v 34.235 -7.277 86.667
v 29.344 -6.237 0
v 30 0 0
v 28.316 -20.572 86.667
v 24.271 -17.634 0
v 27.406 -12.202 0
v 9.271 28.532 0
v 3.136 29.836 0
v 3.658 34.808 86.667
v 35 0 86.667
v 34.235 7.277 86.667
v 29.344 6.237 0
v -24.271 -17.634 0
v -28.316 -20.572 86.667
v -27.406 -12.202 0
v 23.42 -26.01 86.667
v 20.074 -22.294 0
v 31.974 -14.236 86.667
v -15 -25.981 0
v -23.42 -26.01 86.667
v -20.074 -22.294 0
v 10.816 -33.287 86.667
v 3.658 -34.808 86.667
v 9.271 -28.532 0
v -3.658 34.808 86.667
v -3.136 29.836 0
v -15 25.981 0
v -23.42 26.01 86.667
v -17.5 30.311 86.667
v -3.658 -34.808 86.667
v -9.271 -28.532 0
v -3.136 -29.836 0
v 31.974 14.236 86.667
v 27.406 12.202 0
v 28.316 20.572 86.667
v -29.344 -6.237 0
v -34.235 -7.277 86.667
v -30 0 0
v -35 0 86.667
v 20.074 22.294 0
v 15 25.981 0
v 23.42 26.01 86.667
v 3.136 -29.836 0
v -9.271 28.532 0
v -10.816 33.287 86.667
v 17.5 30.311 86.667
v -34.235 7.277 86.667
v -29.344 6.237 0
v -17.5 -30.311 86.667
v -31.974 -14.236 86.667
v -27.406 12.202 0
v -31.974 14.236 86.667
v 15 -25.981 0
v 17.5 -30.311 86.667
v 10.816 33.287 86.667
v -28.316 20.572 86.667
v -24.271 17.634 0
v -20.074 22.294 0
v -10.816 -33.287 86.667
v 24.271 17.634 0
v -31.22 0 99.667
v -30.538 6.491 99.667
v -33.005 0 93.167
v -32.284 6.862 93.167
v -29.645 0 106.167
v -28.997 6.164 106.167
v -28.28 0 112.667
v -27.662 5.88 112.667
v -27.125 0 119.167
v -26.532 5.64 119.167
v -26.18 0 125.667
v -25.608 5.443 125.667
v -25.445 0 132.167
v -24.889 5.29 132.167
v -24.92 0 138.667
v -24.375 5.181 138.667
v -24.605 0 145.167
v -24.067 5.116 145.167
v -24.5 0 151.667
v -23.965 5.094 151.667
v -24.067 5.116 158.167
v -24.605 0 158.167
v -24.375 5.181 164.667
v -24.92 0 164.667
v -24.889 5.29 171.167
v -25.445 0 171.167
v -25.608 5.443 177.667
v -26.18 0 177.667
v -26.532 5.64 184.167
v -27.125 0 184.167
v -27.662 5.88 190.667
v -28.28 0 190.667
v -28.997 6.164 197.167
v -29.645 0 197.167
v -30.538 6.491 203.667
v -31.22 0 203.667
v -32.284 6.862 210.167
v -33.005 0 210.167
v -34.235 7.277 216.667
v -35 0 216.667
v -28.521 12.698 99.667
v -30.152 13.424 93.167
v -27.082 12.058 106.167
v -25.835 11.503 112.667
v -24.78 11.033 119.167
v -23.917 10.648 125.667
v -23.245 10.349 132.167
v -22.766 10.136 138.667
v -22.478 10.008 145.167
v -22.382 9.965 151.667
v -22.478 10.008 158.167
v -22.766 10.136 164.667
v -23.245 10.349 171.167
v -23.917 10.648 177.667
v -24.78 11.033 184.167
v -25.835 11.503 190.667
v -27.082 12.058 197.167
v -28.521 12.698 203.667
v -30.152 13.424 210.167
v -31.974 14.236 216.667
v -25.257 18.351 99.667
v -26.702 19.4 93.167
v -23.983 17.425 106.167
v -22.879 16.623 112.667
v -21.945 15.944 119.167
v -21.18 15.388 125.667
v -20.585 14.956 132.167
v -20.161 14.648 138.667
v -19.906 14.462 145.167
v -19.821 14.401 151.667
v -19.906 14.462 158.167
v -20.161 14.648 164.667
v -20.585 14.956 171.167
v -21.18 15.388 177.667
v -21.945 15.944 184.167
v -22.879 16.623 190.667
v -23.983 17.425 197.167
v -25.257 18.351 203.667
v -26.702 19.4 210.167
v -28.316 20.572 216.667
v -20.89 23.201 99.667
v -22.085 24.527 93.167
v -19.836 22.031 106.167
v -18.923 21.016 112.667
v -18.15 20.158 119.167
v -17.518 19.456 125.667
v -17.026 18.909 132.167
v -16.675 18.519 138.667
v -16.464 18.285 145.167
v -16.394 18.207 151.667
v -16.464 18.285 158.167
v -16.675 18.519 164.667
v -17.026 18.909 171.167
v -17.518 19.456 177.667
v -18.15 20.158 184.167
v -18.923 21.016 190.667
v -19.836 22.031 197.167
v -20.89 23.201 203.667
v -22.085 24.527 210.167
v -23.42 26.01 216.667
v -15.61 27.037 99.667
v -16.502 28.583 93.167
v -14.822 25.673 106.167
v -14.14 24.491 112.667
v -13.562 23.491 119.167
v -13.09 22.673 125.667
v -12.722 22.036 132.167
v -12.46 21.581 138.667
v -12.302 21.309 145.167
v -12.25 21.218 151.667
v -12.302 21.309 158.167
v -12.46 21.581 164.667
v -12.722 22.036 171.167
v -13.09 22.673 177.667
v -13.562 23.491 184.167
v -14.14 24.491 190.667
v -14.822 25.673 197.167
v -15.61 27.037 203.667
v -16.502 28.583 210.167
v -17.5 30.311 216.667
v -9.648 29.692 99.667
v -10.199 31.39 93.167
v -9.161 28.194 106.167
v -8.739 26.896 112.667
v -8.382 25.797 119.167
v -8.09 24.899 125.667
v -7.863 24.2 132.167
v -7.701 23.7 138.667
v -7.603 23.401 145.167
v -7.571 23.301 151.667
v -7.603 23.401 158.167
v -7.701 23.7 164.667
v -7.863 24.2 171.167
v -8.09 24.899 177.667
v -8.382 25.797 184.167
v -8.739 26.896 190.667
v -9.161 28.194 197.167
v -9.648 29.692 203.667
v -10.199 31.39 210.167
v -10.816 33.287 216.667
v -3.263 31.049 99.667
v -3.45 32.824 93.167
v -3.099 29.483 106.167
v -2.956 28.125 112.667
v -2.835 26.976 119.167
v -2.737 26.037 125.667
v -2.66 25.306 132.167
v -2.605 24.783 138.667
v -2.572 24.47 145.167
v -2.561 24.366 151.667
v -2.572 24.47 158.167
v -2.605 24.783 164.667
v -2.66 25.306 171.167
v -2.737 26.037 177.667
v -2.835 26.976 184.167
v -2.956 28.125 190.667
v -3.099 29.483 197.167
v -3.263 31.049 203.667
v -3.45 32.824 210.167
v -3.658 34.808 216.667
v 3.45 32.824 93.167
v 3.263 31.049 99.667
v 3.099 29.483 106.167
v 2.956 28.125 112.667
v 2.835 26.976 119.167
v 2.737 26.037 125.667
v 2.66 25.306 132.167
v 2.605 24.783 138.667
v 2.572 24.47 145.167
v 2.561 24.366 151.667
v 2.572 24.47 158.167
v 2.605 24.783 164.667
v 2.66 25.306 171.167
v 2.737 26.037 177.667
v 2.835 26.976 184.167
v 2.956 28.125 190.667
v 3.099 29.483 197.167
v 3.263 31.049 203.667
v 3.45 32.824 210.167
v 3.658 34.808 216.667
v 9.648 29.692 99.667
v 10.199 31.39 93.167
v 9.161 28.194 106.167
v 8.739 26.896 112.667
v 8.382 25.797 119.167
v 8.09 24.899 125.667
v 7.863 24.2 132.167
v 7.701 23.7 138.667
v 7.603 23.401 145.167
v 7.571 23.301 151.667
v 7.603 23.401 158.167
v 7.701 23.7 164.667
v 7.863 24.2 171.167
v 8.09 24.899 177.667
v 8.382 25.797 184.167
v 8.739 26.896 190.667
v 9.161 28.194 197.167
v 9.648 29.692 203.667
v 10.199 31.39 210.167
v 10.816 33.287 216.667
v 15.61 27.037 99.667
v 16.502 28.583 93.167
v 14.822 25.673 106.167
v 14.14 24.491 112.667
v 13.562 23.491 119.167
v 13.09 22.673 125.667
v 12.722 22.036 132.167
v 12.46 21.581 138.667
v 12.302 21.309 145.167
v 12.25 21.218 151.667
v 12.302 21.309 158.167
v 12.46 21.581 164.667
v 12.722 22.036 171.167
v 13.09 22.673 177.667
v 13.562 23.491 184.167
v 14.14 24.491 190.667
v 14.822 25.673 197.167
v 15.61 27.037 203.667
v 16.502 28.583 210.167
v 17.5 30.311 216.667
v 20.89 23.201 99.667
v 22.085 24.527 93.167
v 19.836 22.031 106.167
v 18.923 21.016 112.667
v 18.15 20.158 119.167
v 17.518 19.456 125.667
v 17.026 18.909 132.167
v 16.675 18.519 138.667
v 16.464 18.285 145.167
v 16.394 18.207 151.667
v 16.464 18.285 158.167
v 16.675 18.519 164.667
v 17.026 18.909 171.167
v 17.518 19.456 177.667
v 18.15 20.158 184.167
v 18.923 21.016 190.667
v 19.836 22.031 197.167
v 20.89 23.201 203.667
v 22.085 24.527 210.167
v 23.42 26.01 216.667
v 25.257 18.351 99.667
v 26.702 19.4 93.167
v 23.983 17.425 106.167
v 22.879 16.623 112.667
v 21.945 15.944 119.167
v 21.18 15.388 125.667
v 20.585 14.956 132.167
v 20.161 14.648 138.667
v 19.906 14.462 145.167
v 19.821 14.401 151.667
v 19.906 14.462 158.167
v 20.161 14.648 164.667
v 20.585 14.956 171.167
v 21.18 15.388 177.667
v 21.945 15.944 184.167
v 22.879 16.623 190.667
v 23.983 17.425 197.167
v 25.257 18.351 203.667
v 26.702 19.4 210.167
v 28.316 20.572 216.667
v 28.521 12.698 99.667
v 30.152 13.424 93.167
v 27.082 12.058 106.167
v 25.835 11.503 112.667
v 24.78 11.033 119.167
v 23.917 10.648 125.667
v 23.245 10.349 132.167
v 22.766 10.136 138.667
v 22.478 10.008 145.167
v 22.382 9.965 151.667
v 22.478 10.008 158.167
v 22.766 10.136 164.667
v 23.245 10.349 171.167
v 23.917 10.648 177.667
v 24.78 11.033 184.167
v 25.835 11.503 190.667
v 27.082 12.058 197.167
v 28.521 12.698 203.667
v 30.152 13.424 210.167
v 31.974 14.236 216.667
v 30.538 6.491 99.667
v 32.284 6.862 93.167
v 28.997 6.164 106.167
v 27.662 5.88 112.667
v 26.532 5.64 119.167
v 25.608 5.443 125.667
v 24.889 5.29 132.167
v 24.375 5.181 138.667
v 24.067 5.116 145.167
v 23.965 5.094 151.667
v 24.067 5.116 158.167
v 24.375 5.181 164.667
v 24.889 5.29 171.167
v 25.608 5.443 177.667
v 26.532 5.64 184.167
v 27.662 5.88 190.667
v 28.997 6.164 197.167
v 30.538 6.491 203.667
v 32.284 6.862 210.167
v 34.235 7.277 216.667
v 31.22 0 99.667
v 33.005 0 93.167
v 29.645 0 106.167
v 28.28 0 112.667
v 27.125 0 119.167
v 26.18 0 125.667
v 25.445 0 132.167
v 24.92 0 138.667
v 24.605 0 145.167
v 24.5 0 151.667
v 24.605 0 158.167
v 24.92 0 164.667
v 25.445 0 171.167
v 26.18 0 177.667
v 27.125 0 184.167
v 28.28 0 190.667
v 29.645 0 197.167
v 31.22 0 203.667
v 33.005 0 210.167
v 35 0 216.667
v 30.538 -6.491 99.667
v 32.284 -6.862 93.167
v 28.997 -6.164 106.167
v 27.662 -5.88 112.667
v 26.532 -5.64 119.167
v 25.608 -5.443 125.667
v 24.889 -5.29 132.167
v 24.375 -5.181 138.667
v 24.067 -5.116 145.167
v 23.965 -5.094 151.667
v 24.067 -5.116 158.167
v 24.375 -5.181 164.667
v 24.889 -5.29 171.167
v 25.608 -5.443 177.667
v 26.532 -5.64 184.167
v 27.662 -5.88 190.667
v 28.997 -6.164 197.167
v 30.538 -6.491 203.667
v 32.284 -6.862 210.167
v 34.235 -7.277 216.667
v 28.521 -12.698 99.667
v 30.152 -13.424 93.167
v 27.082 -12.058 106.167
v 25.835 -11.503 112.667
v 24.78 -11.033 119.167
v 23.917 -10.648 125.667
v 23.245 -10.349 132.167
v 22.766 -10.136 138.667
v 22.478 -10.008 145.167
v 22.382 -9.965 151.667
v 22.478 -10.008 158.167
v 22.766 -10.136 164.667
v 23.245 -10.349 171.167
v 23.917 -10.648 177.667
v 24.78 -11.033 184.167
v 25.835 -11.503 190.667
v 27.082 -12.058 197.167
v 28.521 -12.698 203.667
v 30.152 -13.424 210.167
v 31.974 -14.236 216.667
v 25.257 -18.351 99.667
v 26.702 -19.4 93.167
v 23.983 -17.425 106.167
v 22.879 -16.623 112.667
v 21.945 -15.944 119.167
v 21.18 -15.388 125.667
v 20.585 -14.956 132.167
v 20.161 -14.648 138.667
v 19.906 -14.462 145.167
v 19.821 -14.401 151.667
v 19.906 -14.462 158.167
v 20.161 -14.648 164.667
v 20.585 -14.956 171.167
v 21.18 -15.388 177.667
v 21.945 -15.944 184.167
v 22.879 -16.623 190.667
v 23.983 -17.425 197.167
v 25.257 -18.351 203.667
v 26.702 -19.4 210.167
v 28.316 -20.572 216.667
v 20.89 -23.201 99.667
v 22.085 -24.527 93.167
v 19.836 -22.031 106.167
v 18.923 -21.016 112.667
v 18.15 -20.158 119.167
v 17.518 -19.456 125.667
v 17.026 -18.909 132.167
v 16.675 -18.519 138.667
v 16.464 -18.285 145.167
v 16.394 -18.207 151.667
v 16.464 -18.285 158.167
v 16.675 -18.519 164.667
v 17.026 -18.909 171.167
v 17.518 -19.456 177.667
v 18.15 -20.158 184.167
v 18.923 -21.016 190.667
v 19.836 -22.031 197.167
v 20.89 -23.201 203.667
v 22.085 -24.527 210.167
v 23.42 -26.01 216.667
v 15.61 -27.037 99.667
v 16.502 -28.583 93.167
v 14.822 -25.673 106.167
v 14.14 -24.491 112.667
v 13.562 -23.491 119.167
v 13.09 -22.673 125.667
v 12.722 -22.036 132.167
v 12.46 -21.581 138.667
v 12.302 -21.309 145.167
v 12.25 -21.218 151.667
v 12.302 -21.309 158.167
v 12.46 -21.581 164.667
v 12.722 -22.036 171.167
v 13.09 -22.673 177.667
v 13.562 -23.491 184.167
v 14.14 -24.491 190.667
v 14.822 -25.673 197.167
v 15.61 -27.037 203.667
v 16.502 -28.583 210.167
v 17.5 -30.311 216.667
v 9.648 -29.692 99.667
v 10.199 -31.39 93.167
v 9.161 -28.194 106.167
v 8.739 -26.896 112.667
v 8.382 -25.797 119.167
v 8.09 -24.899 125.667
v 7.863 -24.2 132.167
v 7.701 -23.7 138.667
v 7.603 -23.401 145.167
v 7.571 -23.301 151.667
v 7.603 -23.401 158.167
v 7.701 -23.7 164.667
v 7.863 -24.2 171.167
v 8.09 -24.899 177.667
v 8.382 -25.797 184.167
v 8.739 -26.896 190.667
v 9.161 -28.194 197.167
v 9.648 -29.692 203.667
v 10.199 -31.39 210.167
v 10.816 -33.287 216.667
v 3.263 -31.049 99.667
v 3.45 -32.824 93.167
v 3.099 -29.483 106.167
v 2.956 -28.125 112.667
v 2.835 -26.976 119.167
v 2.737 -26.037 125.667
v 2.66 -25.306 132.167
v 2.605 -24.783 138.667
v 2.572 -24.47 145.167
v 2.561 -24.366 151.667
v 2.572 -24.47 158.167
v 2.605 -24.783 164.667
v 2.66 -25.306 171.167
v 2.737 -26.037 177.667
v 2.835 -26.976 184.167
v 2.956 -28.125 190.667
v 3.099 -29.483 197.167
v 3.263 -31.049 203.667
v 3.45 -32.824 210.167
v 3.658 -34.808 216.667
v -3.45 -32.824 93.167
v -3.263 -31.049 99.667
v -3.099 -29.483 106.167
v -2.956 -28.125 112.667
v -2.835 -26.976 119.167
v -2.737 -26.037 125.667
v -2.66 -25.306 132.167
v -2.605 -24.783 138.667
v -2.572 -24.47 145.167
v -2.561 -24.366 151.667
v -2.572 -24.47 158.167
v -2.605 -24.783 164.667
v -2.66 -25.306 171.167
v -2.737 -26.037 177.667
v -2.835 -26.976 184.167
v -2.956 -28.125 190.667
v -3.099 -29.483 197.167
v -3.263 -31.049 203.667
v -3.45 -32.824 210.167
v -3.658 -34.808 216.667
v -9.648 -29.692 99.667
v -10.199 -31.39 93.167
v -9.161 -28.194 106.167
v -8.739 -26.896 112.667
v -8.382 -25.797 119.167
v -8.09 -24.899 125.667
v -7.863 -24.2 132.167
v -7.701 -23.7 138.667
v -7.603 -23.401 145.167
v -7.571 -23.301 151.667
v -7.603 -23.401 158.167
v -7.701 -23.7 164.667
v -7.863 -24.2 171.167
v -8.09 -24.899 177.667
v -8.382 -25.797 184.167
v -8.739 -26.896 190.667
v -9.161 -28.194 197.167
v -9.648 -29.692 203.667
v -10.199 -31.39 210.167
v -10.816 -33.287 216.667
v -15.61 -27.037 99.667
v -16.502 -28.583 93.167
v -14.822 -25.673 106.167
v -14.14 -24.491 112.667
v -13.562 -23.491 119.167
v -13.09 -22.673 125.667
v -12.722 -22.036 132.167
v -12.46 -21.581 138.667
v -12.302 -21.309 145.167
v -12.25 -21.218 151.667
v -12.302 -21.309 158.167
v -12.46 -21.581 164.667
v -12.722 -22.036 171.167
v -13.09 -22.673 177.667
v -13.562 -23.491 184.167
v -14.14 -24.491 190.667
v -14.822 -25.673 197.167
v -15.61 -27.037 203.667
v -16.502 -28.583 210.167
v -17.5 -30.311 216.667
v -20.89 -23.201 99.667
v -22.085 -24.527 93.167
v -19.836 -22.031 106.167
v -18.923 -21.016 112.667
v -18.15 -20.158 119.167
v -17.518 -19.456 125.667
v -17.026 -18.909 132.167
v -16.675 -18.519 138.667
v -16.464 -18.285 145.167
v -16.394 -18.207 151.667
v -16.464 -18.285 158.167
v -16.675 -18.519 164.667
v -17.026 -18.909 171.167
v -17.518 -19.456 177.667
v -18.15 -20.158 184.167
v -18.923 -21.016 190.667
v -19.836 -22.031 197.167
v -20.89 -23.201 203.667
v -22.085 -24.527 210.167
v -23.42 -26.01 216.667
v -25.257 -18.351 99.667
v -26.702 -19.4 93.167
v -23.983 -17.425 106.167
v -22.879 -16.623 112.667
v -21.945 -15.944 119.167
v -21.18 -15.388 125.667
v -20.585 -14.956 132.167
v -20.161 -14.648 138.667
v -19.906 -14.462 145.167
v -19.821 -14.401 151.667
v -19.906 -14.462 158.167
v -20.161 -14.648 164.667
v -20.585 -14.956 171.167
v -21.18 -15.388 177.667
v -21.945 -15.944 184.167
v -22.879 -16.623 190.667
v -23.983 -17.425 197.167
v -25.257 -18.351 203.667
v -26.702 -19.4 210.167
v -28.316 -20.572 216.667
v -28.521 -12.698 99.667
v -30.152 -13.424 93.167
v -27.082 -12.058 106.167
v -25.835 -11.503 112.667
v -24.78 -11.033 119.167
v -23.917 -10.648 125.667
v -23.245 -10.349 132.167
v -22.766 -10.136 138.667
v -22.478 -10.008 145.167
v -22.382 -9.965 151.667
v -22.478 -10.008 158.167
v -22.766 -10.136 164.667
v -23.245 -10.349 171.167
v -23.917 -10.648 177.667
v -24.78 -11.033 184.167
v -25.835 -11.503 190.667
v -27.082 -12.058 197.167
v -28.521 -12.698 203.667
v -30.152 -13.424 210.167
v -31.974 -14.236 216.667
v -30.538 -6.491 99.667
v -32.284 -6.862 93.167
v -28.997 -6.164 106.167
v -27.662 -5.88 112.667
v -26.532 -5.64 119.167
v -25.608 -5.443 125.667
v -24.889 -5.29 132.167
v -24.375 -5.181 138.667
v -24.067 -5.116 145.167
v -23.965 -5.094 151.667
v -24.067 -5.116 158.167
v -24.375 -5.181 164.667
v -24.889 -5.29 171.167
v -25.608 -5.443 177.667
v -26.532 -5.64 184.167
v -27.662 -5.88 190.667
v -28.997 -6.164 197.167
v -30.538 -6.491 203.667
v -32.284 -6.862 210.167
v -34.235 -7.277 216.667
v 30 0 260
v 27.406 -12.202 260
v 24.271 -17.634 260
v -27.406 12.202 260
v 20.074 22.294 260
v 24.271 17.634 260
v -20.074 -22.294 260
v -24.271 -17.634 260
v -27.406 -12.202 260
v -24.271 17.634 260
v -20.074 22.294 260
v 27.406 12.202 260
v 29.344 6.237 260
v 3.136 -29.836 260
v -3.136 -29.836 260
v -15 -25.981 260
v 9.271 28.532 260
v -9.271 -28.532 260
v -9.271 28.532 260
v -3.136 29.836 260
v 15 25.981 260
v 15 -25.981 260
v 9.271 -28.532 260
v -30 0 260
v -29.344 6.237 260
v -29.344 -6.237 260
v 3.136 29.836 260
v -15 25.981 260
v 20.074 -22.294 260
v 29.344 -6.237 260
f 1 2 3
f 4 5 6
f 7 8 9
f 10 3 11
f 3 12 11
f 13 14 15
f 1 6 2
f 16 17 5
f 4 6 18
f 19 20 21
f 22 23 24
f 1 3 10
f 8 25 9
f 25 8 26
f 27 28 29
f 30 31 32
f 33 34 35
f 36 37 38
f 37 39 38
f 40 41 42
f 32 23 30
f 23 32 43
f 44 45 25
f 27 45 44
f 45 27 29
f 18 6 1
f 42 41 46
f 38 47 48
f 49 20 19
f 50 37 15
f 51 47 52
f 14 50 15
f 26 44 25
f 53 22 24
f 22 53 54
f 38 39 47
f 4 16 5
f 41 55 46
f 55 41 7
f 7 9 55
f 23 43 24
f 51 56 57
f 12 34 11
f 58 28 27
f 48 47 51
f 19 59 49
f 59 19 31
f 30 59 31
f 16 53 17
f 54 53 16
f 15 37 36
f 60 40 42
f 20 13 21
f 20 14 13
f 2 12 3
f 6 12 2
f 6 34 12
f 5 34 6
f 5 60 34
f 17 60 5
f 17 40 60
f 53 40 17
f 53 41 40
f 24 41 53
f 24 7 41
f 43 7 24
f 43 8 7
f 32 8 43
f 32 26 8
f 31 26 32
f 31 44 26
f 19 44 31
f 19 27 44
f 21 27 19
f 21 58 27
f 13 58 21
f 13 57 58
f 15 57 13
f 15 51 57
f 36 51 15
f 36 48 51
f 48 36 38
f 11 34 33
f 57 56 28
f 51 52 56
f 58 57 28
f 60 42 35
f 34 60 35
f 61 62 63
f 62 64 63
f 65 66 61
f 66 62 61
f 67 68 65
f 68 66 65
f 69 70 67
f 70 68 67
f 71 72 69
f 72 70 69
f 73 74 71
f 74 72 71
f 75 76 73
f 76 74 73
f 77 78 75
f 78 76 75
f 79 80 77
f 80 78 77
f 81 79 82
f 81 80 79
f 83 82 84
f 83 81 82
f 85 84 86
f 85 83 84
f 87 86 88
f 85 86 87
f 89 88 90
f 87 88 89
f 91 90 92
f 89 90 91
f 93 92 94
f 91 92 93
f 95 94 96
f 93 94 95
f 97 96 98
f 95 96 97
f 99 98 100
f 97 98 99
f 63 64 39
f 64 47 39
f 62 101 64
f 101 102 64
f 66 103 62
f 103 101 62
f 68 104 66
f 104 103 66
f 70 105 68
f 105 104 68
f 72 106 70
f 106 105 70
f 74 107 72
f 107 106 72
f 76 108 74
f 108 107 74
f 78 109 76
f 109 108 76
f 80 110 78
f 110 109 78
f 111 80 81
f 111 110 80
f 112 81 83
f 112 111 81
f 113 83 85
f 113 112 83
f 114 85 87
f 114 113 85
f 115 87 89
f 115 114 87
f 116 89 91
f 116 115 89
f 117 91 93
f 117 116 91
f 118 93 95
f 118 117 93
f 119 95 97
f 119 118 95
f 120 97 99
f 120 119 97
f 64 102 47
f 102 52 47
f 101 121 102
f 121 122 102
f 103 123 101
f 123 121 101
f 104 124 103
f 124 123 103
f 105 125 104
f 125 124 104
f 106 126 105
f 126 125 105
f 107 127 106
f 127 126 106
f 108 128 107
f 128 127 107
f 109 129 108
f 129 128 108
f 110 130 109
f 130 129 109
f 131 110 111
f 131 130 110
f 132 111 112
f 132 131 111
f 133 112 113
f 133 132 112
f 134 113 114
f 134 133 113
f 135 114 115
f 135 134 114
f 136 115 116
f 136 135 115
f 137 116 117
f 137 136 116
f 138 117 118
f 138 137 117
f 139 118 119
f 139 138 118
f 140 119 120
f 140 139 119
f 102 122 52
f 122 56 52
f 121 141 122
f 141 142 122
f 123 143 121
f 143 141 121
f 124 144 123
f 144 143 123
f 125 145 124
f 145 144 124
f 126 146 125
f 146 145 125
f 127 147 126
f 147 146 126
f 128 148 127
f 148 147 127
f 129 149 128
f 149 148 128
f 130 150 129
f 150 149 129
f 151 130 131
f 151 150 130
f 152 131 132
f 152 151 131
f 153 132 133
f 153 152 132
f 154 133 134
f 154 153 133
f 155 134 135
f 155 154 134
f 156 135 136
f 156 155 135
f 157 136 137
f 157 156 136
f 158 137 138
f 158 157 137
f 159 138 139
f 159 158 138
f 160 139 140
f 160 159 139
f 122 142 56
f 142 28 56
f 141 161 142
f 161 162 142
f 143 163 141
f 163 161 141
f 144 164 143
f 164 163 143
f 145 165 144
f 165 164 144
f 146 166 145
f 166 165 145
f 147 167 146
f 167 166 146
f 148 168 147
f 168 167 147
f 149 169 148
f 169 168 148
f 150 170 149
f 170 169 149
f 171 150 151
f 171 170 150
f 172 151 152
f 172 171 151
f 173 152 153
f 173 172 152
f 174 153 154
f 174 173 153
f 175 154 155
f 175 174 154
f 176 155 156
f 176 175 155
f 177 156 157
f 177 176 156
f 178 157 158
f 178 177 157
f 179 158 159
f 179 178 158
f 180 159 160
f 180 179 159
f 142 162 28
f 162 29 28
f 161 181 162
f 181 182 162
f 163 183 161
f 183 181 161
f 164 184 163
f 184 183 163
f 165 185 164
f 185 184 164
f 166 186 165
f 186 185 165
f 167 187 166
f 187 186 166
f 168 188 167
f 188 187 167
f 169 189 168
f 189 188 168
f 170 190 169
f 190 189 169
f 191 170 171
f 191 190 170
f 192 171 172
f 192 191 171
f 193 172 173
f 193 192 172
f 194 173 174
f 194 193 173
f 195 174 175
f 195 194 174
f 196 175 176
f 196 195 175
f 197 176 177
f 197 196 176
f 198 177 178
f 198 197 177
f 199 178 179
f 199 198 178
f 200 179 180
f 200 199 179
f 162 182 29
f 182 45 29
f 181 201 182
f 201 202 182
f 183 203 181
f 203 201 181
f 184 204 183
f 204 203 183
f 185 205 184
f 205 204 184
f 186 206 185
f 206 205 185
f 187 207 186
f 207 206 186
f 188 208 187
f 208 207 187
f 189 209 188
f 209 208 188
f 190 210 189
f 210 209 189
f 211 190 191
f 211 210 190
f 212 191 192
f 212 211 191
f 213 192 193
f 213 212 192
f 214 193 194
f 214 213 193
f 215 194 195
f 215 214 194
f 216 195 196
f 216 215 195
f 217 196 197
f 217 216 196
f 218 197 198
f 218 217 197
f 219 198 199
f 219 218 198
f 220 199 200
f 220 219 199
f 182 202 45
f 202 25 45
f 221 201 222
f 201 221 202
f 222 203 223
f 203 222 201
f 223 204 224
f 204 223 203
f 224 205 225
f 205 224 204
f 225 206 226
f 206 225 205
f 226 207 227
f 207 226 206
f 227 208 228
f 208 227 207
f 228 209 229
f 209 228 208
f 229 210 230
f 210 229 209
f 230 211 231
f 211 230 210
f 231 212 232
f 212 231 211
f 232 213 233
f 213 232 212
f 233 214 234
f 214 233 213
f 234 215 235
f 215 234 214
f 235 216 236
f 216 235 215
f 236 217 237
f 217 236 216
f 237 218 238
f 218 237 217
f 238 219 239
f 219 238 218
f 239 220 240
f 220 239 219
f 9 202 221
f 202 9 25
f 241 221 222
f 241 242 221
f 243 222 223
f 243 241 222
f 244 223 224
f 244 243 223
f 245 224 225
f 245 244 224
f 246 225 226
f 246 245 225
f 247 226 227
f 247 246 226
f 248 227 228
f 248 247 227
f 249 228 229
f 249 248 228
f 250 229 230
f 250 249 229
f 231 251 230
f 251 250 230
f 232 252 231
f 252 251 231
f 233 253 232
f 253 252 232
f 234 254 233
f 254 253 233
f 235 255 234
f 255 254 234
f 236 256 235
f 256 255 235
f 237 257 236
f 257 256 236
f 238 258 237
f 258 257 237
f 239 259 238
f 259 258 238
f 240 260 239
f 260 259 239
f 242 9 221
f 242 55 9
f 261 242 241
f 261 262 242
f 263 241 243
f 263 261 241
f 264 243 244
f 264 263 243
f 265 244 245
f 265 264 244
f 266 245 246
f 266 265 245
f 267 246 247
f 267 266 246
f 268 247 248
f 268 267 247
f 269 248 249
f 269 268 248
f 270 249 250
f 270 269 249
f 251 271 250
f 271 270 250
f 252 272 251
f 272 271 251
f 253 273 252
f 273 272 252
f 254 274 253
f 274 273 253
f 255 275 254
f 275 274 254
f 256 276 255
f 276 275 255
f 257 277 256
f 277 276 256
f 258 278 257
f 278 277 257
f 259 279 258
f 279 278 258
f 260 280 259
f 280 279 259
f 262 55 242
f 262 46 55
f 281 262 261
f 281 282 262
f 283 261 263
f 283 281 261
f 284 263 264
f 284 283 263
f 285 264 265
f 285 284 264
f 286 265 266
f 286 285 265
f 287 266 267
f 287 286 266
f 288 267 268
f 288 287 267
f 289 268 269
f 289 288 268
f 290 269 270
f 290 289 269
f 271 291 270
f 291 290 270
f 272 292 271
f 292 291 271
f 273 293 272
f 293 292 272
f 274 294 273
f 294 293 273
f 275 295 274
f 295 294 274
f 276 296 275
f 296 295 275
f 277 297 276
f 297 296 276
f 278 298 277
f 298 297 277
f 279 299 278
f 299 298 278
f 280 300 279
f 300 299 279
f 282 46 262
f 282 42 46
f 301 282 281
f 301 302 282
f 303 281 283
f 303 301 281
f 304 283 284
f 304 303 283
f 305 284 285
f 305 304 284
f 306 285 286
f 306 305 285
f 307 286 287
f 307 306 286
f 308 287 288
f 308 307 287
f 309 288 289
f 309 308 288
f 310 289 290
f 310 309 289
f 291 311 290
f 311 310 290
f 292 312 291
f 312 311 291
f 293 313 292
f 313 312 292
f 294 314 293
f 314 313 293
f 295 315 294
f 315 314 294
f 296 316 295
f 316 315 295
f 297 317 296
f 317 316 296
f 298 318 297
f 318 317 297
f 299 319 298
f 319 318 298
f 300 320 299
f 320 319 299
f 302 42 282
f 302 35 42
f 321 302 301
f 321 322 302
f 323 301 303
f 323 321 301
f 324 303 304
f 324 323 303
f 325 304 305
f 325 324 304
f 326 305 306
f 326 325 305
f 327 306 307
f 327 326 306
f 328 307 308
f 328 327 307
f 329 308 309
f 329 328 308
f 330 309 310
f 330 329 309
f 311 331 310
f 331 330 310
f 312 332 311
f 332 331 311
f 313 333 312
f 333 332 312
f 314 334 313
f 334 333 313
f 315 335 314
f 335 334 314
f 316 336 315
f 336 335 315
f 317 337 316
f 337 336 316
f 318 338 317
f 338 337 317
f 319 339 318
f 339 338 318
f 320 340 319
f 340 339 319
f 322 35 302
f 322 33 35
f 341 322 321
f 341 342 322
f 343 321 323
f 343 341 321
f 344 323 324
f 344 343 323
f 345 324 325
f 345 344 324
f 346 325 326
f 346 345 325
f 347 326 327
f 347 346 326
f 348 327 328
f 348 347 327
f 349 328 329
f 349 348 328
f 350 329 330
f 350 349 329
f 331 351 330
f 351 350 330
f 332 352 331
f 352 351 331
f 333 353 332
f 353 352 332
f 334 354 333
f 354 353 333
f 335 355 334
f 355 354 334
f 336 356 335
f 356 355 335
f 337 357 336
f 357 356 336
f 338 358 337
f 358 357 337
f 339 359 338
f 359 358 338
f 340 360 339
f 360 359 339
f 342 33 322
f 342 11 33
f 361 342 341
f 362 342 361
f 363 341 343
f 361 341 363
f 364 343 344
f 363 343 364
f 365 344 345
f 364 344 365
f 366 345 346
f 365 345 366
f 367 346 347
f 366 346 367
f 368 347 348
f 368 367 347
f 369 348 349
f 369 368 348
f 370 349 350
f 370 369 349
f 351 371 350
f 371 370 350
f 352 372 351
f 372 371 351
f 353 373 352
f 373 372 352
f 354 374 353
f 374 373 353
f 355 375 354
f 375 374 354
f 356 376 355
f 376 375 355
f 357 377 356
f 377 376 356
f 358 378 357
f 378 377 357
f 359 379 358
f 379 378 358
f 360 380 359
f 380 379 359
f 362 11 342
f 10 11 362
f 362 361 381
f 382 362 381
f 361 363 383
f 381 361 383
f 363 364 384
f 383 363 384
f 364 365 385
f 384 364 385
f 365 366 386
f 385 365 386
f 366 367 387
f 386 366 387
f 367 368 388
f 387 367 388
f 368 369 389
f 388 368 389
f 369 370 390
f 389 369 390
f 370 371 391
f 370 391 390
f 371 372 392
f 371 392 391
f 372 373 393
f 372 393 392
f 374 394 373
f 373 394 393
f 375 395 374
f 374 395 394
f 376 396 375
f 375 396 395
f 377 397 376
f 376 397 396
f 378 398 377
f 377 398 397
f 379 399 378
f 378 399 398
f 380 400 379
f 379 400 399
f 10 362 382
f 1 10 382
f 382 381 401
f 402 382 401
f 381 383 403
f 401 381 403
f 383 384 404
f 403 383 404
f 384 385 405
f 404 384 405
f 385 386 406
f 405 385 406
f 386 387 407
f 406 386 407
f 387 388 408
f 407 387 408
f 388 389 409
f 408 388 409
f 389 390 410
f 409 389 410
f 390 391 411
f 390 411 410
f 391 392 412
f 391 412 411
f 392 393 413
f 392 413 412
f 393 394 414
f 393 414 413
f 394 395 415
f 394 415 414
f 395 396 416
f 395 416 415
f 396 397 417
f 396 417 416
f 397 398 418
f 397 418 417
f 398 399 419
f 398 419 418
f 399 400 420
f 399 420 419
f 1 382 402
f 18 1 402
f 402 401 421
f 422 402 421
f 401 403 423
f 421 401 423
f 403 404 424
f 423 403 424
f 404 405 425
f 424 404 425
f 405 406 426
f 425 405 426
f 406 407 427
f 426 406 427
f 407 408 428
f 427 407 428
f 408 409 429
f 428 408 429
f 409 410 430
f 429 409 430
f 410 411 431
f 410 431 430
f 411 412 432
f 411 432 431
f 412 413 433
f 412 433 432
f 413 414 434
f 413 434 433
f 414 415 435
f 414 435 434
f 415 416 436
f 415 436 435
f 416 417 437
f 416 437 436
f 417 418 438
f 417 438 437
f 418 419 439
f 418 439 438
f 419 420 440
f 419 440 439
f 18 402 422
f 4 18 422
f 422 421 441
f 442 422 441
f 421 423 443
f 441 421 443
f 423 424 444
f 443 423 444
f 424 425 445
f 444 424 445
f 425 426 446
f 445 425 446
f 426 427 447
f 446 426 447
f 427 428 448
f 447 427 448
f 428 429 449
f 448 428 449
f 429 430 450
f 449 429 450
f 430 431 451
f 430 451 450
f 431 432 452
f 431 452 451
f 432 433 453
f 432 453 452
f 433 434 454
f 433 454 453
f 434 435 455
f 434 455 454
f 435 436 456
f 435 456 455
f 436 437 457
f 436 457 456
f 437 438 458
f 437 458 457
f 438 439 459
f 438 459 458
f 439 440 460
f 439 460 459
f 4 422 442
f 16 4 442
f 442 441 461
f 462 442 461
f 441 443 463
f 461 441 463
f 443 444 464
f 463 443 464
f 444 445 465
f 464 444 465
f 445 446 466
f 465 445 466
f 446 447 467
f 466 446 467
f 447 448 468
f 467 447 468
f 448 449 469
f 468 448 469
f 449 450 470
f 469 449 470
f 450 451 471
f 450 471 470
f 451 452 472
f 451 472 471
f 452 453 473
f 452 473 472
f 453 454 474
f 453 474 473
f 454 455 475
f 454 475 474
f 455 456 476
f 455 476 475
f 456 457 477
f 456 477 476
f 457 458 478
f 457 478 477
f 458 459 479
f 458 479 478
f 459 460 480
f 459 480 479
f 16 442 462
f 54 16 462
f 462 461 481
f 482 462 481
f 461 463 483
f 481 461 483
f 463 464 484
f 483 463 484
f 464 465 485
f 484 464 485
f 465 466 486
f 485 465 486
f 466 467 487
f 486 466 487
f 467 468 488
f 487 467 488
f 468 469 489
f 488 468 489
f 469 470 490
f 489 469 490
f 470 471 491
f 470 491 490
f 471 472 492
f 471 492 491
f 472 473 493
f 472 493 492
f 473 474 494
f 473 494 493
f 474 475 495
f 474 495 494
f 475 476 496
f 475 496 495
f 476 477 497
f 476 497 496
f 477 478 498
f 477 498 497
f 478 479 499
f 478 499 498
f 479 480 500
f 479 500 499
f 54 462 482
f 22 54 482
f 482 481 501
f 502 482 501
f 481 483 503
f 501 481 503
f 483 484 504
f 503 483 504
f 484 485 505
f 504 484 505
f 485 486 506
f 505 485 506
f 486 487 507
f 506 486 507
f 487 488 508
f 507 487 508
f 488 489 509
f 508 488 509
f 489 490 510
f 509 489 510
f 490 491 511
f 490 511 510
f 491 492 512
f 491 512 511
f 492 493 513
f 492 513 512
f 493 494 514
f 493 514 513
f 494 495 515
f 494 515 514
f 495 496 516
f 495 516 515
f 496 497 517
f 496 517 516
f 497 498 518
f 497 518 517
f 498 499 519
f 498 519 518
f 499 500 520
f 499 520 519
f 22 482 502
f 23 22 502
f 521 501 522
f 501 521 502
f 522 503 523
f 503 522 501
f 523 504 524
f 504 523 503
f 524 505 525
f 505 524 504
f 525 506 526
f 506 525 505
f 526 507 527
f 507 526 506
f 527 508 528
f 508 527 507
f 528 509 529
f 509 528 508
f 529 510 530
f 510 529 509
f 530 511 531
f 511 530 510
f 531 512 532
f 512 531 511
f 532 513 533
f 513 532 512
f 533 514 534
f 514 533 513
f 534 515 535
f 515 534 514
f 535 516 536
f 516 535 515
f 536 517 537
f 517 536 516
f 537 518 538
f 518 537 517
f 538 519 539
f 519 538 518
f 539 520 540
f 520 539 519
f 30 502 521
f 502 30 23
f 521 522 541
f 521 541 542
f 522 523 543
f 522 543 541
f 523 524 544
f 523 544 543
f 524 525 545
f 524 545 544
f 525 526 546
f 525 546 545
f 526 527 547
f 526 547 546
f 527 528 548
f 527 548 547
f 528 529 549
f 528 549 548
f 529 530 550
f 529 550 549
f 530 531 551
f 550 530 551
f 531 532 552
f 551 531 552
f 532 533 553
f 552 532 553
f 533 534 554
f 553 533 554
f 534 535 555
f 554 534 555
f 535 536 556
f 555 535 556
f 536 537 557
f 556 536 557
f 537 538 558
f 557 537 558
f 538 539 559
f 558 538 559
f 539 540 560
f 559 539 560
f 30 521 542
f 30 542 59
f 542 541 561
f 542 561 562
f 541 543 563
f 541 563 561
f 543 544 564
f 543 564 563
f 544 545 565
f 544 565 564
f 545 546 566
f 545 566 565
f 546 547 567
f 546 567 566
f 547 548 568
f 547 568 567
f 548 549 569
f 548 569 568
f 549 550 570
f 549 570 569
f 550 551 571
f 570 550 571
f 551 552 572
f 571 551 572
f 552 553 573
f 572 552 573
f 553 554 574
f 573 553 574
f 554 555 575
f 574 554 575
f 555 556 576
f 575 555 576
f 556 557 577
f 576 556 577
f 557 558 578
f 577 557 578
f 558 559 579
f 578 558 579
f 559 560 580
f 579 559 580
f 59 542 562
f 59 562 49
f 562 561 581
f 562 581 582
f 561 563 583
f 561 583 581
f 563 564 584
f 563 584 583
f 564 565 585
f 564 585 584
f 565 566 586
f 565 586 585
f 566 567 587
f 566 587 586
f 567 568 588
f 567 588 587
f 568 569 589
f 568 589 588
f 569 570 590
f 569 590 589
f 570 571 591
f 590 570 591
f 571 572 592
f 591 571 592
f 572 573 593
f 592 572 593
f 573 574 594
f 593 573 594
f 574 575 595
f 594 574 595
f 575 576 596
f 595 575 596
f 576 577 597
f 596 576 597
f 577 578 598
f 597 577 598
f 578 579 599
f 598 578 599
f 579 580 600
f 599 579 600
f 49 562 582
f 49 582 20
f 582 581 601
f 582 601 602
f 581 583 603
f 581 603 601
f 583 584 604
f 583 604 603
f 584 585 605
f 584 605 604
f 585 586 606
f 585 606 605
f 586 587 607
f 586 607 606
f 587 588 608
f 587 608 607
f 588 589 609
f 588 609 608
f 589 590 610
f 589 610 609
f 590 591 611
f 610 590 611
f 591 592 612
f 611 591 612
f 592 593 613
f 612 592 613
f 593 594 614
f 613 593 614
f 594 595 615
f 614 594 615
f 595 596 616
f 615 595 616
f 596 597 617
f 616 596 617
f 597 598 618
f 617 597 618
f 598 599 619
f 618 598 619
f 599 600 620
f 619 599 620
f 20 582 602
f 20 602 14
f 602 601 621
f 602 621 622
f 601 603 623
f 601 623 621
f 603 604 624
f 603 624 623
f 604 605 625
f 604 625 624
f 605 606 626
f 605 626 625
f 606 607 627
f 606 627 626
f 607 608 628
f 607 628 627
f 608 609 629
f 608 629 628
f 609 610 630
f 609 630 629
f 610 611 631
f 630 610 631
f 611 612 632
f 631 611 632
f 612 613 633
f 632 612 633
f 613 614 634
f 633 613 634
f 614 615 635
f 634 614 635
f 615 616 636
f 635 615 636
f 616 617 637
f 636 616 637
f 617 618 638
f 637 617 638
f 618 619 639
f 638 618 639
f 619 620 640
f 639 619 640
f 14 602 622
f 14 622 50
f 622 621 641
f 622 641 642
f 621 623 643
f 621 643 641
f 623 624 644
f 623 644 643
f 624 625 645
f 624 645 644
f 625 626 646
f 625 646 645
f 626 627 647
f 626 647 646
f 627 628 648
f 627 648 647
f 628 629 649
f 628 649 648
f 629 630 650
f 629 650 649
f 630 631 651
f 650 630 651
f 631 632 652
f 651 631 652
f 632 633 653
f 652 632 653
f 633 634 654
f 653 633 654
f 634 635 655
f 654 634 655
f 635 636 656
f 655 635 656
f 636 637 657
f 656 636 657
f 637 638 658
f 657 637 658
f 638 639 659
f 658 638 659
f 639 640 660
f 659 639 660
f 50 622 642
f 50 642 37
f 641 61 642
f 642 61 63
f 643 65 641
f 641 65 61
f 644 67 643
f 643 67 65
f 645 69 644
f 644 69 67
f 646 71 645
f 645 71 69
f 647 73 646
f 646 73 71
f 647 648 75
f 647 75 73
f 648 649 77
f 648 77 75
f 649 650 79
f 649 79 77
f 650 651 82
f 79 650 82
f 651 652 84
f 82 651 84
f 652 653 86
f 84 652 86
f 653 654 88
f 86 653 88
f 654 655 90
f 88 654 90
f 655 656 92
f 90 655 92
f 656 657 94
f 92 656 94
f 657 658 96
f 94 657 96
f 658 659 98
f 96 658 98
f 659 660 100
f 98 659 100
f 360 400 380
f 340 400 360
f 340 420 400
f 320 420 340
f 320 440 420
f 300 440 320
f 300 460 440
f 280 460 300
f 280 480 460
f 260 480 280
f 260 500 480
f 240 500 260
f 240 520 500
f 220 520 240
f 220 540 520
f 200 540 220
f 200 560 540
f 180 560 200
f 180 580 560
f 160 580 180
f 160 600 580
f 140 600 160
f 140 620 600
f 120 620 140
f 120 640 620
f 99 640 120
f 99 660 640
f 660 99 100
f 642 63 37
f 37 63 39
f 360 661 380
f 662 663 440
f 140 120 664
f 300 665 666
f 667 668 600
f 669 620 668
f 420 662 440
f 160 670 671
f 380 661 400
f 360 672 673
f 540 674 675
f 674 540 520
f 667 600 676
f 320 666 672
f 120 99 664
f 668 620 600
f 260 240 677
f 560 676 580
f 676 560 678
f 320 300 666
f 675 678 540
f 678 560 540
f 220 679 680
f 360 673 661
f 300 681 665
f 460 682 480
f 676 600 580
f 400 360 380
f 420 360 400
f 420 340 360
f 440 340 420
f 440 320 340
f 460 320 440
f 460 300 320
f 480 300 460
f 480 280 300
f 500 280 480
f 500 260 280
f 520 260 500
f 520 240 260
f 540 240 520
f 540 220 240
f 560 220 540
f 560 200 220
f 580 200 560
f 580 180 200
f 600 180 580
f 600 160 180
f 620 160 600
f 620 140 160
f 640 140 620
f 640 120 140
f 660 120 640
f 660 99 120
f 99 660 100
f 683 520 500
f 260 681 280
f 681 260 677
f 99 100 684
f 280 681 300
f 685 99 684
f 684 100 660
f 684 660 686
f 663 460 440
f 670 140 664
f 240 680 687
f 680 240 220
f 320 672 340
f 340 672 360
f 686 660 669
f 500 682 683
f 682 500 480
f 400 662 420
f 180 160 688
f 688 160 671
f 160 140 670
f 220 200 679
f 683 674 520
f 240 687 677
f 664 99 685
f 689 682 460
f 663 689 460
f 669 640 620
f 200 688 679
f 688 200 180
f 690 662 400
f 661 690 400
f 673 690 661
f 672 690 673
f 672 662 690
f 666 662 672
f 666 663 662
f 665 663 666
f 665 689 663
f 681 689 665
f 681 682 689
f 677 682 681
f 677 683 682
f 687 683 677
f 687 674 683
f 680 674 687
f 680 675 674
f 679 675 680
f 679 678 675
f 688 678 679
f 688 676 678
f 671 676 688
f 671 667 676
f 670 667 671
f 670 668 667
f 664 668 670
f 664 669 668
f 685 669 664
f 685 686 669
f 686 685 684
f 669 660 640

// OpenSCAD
// grapje: Een getailleerde fles.

HEIGTH = 260;   // total height of bottle
DIA0 = 60;      // diameter at bottom
DIA1 = 70;      // diameter at beginning of curvy bit
BULBYBIT=28/2;  // (target) radius of bulby bit (not exact)
DIA2 = 70;      // diameter at top of bulby but
DIA3 = 60;      // diameter at top of bottle / start of handle

// do not change below, these are calculated from total height
HC1=HEIGTH/3;   
HC2=HEIGTH/6;
HBB=HEIGTH-HC1-HC2;


points = [[DIA1/2,0],[BULBYBIT,HBB/2],[DIA2/2,HBB]];

curvepoints = [for (i=[0:0.05:1]) bezier(points,i) ];

// Quadratic Bezier curve rastering
// Aart 09-2018 Aartsite.nl
    function bezier (P,t) =
        let(
                x1 = P[0][0] + (( P[1][0] - P[0][0]) *t),
                y1 = P[0][1] + (( P[1][1] - P[0][1]) *t),
                x2 = P[1][0] + (( P[2][0] - P[1][0]) *t),
                y2 = P[1][1] + (( P[2][1] - P[1][1]) *t),
                x=x1+((x2-x1)*t),
                y=y1+((y2-y1)*t)
                ) ([x,y]);

bottlepoly = concat ([[0,0]],curvepoints,[[0,points[2][1]]] ); // TODO: iets om uit de "points" list de begin en eindpunten te halen, maar dan tegen 0 aan. Dus zegmaar points[2][1] oid
echo (bottlepoly);

echo(points[2][1]); // zo dus


color("red") cylinder(d1=DIA0,d2=DIA1,h=HC1);

color("green")  translate([0,0,HC1]) rotate_extrude() polygon(bottlepoly);    

color("blue") translate([0,0,HC1+HBB]) cylinder(d1=DIA2,d2=DIA3,h=HC2);
